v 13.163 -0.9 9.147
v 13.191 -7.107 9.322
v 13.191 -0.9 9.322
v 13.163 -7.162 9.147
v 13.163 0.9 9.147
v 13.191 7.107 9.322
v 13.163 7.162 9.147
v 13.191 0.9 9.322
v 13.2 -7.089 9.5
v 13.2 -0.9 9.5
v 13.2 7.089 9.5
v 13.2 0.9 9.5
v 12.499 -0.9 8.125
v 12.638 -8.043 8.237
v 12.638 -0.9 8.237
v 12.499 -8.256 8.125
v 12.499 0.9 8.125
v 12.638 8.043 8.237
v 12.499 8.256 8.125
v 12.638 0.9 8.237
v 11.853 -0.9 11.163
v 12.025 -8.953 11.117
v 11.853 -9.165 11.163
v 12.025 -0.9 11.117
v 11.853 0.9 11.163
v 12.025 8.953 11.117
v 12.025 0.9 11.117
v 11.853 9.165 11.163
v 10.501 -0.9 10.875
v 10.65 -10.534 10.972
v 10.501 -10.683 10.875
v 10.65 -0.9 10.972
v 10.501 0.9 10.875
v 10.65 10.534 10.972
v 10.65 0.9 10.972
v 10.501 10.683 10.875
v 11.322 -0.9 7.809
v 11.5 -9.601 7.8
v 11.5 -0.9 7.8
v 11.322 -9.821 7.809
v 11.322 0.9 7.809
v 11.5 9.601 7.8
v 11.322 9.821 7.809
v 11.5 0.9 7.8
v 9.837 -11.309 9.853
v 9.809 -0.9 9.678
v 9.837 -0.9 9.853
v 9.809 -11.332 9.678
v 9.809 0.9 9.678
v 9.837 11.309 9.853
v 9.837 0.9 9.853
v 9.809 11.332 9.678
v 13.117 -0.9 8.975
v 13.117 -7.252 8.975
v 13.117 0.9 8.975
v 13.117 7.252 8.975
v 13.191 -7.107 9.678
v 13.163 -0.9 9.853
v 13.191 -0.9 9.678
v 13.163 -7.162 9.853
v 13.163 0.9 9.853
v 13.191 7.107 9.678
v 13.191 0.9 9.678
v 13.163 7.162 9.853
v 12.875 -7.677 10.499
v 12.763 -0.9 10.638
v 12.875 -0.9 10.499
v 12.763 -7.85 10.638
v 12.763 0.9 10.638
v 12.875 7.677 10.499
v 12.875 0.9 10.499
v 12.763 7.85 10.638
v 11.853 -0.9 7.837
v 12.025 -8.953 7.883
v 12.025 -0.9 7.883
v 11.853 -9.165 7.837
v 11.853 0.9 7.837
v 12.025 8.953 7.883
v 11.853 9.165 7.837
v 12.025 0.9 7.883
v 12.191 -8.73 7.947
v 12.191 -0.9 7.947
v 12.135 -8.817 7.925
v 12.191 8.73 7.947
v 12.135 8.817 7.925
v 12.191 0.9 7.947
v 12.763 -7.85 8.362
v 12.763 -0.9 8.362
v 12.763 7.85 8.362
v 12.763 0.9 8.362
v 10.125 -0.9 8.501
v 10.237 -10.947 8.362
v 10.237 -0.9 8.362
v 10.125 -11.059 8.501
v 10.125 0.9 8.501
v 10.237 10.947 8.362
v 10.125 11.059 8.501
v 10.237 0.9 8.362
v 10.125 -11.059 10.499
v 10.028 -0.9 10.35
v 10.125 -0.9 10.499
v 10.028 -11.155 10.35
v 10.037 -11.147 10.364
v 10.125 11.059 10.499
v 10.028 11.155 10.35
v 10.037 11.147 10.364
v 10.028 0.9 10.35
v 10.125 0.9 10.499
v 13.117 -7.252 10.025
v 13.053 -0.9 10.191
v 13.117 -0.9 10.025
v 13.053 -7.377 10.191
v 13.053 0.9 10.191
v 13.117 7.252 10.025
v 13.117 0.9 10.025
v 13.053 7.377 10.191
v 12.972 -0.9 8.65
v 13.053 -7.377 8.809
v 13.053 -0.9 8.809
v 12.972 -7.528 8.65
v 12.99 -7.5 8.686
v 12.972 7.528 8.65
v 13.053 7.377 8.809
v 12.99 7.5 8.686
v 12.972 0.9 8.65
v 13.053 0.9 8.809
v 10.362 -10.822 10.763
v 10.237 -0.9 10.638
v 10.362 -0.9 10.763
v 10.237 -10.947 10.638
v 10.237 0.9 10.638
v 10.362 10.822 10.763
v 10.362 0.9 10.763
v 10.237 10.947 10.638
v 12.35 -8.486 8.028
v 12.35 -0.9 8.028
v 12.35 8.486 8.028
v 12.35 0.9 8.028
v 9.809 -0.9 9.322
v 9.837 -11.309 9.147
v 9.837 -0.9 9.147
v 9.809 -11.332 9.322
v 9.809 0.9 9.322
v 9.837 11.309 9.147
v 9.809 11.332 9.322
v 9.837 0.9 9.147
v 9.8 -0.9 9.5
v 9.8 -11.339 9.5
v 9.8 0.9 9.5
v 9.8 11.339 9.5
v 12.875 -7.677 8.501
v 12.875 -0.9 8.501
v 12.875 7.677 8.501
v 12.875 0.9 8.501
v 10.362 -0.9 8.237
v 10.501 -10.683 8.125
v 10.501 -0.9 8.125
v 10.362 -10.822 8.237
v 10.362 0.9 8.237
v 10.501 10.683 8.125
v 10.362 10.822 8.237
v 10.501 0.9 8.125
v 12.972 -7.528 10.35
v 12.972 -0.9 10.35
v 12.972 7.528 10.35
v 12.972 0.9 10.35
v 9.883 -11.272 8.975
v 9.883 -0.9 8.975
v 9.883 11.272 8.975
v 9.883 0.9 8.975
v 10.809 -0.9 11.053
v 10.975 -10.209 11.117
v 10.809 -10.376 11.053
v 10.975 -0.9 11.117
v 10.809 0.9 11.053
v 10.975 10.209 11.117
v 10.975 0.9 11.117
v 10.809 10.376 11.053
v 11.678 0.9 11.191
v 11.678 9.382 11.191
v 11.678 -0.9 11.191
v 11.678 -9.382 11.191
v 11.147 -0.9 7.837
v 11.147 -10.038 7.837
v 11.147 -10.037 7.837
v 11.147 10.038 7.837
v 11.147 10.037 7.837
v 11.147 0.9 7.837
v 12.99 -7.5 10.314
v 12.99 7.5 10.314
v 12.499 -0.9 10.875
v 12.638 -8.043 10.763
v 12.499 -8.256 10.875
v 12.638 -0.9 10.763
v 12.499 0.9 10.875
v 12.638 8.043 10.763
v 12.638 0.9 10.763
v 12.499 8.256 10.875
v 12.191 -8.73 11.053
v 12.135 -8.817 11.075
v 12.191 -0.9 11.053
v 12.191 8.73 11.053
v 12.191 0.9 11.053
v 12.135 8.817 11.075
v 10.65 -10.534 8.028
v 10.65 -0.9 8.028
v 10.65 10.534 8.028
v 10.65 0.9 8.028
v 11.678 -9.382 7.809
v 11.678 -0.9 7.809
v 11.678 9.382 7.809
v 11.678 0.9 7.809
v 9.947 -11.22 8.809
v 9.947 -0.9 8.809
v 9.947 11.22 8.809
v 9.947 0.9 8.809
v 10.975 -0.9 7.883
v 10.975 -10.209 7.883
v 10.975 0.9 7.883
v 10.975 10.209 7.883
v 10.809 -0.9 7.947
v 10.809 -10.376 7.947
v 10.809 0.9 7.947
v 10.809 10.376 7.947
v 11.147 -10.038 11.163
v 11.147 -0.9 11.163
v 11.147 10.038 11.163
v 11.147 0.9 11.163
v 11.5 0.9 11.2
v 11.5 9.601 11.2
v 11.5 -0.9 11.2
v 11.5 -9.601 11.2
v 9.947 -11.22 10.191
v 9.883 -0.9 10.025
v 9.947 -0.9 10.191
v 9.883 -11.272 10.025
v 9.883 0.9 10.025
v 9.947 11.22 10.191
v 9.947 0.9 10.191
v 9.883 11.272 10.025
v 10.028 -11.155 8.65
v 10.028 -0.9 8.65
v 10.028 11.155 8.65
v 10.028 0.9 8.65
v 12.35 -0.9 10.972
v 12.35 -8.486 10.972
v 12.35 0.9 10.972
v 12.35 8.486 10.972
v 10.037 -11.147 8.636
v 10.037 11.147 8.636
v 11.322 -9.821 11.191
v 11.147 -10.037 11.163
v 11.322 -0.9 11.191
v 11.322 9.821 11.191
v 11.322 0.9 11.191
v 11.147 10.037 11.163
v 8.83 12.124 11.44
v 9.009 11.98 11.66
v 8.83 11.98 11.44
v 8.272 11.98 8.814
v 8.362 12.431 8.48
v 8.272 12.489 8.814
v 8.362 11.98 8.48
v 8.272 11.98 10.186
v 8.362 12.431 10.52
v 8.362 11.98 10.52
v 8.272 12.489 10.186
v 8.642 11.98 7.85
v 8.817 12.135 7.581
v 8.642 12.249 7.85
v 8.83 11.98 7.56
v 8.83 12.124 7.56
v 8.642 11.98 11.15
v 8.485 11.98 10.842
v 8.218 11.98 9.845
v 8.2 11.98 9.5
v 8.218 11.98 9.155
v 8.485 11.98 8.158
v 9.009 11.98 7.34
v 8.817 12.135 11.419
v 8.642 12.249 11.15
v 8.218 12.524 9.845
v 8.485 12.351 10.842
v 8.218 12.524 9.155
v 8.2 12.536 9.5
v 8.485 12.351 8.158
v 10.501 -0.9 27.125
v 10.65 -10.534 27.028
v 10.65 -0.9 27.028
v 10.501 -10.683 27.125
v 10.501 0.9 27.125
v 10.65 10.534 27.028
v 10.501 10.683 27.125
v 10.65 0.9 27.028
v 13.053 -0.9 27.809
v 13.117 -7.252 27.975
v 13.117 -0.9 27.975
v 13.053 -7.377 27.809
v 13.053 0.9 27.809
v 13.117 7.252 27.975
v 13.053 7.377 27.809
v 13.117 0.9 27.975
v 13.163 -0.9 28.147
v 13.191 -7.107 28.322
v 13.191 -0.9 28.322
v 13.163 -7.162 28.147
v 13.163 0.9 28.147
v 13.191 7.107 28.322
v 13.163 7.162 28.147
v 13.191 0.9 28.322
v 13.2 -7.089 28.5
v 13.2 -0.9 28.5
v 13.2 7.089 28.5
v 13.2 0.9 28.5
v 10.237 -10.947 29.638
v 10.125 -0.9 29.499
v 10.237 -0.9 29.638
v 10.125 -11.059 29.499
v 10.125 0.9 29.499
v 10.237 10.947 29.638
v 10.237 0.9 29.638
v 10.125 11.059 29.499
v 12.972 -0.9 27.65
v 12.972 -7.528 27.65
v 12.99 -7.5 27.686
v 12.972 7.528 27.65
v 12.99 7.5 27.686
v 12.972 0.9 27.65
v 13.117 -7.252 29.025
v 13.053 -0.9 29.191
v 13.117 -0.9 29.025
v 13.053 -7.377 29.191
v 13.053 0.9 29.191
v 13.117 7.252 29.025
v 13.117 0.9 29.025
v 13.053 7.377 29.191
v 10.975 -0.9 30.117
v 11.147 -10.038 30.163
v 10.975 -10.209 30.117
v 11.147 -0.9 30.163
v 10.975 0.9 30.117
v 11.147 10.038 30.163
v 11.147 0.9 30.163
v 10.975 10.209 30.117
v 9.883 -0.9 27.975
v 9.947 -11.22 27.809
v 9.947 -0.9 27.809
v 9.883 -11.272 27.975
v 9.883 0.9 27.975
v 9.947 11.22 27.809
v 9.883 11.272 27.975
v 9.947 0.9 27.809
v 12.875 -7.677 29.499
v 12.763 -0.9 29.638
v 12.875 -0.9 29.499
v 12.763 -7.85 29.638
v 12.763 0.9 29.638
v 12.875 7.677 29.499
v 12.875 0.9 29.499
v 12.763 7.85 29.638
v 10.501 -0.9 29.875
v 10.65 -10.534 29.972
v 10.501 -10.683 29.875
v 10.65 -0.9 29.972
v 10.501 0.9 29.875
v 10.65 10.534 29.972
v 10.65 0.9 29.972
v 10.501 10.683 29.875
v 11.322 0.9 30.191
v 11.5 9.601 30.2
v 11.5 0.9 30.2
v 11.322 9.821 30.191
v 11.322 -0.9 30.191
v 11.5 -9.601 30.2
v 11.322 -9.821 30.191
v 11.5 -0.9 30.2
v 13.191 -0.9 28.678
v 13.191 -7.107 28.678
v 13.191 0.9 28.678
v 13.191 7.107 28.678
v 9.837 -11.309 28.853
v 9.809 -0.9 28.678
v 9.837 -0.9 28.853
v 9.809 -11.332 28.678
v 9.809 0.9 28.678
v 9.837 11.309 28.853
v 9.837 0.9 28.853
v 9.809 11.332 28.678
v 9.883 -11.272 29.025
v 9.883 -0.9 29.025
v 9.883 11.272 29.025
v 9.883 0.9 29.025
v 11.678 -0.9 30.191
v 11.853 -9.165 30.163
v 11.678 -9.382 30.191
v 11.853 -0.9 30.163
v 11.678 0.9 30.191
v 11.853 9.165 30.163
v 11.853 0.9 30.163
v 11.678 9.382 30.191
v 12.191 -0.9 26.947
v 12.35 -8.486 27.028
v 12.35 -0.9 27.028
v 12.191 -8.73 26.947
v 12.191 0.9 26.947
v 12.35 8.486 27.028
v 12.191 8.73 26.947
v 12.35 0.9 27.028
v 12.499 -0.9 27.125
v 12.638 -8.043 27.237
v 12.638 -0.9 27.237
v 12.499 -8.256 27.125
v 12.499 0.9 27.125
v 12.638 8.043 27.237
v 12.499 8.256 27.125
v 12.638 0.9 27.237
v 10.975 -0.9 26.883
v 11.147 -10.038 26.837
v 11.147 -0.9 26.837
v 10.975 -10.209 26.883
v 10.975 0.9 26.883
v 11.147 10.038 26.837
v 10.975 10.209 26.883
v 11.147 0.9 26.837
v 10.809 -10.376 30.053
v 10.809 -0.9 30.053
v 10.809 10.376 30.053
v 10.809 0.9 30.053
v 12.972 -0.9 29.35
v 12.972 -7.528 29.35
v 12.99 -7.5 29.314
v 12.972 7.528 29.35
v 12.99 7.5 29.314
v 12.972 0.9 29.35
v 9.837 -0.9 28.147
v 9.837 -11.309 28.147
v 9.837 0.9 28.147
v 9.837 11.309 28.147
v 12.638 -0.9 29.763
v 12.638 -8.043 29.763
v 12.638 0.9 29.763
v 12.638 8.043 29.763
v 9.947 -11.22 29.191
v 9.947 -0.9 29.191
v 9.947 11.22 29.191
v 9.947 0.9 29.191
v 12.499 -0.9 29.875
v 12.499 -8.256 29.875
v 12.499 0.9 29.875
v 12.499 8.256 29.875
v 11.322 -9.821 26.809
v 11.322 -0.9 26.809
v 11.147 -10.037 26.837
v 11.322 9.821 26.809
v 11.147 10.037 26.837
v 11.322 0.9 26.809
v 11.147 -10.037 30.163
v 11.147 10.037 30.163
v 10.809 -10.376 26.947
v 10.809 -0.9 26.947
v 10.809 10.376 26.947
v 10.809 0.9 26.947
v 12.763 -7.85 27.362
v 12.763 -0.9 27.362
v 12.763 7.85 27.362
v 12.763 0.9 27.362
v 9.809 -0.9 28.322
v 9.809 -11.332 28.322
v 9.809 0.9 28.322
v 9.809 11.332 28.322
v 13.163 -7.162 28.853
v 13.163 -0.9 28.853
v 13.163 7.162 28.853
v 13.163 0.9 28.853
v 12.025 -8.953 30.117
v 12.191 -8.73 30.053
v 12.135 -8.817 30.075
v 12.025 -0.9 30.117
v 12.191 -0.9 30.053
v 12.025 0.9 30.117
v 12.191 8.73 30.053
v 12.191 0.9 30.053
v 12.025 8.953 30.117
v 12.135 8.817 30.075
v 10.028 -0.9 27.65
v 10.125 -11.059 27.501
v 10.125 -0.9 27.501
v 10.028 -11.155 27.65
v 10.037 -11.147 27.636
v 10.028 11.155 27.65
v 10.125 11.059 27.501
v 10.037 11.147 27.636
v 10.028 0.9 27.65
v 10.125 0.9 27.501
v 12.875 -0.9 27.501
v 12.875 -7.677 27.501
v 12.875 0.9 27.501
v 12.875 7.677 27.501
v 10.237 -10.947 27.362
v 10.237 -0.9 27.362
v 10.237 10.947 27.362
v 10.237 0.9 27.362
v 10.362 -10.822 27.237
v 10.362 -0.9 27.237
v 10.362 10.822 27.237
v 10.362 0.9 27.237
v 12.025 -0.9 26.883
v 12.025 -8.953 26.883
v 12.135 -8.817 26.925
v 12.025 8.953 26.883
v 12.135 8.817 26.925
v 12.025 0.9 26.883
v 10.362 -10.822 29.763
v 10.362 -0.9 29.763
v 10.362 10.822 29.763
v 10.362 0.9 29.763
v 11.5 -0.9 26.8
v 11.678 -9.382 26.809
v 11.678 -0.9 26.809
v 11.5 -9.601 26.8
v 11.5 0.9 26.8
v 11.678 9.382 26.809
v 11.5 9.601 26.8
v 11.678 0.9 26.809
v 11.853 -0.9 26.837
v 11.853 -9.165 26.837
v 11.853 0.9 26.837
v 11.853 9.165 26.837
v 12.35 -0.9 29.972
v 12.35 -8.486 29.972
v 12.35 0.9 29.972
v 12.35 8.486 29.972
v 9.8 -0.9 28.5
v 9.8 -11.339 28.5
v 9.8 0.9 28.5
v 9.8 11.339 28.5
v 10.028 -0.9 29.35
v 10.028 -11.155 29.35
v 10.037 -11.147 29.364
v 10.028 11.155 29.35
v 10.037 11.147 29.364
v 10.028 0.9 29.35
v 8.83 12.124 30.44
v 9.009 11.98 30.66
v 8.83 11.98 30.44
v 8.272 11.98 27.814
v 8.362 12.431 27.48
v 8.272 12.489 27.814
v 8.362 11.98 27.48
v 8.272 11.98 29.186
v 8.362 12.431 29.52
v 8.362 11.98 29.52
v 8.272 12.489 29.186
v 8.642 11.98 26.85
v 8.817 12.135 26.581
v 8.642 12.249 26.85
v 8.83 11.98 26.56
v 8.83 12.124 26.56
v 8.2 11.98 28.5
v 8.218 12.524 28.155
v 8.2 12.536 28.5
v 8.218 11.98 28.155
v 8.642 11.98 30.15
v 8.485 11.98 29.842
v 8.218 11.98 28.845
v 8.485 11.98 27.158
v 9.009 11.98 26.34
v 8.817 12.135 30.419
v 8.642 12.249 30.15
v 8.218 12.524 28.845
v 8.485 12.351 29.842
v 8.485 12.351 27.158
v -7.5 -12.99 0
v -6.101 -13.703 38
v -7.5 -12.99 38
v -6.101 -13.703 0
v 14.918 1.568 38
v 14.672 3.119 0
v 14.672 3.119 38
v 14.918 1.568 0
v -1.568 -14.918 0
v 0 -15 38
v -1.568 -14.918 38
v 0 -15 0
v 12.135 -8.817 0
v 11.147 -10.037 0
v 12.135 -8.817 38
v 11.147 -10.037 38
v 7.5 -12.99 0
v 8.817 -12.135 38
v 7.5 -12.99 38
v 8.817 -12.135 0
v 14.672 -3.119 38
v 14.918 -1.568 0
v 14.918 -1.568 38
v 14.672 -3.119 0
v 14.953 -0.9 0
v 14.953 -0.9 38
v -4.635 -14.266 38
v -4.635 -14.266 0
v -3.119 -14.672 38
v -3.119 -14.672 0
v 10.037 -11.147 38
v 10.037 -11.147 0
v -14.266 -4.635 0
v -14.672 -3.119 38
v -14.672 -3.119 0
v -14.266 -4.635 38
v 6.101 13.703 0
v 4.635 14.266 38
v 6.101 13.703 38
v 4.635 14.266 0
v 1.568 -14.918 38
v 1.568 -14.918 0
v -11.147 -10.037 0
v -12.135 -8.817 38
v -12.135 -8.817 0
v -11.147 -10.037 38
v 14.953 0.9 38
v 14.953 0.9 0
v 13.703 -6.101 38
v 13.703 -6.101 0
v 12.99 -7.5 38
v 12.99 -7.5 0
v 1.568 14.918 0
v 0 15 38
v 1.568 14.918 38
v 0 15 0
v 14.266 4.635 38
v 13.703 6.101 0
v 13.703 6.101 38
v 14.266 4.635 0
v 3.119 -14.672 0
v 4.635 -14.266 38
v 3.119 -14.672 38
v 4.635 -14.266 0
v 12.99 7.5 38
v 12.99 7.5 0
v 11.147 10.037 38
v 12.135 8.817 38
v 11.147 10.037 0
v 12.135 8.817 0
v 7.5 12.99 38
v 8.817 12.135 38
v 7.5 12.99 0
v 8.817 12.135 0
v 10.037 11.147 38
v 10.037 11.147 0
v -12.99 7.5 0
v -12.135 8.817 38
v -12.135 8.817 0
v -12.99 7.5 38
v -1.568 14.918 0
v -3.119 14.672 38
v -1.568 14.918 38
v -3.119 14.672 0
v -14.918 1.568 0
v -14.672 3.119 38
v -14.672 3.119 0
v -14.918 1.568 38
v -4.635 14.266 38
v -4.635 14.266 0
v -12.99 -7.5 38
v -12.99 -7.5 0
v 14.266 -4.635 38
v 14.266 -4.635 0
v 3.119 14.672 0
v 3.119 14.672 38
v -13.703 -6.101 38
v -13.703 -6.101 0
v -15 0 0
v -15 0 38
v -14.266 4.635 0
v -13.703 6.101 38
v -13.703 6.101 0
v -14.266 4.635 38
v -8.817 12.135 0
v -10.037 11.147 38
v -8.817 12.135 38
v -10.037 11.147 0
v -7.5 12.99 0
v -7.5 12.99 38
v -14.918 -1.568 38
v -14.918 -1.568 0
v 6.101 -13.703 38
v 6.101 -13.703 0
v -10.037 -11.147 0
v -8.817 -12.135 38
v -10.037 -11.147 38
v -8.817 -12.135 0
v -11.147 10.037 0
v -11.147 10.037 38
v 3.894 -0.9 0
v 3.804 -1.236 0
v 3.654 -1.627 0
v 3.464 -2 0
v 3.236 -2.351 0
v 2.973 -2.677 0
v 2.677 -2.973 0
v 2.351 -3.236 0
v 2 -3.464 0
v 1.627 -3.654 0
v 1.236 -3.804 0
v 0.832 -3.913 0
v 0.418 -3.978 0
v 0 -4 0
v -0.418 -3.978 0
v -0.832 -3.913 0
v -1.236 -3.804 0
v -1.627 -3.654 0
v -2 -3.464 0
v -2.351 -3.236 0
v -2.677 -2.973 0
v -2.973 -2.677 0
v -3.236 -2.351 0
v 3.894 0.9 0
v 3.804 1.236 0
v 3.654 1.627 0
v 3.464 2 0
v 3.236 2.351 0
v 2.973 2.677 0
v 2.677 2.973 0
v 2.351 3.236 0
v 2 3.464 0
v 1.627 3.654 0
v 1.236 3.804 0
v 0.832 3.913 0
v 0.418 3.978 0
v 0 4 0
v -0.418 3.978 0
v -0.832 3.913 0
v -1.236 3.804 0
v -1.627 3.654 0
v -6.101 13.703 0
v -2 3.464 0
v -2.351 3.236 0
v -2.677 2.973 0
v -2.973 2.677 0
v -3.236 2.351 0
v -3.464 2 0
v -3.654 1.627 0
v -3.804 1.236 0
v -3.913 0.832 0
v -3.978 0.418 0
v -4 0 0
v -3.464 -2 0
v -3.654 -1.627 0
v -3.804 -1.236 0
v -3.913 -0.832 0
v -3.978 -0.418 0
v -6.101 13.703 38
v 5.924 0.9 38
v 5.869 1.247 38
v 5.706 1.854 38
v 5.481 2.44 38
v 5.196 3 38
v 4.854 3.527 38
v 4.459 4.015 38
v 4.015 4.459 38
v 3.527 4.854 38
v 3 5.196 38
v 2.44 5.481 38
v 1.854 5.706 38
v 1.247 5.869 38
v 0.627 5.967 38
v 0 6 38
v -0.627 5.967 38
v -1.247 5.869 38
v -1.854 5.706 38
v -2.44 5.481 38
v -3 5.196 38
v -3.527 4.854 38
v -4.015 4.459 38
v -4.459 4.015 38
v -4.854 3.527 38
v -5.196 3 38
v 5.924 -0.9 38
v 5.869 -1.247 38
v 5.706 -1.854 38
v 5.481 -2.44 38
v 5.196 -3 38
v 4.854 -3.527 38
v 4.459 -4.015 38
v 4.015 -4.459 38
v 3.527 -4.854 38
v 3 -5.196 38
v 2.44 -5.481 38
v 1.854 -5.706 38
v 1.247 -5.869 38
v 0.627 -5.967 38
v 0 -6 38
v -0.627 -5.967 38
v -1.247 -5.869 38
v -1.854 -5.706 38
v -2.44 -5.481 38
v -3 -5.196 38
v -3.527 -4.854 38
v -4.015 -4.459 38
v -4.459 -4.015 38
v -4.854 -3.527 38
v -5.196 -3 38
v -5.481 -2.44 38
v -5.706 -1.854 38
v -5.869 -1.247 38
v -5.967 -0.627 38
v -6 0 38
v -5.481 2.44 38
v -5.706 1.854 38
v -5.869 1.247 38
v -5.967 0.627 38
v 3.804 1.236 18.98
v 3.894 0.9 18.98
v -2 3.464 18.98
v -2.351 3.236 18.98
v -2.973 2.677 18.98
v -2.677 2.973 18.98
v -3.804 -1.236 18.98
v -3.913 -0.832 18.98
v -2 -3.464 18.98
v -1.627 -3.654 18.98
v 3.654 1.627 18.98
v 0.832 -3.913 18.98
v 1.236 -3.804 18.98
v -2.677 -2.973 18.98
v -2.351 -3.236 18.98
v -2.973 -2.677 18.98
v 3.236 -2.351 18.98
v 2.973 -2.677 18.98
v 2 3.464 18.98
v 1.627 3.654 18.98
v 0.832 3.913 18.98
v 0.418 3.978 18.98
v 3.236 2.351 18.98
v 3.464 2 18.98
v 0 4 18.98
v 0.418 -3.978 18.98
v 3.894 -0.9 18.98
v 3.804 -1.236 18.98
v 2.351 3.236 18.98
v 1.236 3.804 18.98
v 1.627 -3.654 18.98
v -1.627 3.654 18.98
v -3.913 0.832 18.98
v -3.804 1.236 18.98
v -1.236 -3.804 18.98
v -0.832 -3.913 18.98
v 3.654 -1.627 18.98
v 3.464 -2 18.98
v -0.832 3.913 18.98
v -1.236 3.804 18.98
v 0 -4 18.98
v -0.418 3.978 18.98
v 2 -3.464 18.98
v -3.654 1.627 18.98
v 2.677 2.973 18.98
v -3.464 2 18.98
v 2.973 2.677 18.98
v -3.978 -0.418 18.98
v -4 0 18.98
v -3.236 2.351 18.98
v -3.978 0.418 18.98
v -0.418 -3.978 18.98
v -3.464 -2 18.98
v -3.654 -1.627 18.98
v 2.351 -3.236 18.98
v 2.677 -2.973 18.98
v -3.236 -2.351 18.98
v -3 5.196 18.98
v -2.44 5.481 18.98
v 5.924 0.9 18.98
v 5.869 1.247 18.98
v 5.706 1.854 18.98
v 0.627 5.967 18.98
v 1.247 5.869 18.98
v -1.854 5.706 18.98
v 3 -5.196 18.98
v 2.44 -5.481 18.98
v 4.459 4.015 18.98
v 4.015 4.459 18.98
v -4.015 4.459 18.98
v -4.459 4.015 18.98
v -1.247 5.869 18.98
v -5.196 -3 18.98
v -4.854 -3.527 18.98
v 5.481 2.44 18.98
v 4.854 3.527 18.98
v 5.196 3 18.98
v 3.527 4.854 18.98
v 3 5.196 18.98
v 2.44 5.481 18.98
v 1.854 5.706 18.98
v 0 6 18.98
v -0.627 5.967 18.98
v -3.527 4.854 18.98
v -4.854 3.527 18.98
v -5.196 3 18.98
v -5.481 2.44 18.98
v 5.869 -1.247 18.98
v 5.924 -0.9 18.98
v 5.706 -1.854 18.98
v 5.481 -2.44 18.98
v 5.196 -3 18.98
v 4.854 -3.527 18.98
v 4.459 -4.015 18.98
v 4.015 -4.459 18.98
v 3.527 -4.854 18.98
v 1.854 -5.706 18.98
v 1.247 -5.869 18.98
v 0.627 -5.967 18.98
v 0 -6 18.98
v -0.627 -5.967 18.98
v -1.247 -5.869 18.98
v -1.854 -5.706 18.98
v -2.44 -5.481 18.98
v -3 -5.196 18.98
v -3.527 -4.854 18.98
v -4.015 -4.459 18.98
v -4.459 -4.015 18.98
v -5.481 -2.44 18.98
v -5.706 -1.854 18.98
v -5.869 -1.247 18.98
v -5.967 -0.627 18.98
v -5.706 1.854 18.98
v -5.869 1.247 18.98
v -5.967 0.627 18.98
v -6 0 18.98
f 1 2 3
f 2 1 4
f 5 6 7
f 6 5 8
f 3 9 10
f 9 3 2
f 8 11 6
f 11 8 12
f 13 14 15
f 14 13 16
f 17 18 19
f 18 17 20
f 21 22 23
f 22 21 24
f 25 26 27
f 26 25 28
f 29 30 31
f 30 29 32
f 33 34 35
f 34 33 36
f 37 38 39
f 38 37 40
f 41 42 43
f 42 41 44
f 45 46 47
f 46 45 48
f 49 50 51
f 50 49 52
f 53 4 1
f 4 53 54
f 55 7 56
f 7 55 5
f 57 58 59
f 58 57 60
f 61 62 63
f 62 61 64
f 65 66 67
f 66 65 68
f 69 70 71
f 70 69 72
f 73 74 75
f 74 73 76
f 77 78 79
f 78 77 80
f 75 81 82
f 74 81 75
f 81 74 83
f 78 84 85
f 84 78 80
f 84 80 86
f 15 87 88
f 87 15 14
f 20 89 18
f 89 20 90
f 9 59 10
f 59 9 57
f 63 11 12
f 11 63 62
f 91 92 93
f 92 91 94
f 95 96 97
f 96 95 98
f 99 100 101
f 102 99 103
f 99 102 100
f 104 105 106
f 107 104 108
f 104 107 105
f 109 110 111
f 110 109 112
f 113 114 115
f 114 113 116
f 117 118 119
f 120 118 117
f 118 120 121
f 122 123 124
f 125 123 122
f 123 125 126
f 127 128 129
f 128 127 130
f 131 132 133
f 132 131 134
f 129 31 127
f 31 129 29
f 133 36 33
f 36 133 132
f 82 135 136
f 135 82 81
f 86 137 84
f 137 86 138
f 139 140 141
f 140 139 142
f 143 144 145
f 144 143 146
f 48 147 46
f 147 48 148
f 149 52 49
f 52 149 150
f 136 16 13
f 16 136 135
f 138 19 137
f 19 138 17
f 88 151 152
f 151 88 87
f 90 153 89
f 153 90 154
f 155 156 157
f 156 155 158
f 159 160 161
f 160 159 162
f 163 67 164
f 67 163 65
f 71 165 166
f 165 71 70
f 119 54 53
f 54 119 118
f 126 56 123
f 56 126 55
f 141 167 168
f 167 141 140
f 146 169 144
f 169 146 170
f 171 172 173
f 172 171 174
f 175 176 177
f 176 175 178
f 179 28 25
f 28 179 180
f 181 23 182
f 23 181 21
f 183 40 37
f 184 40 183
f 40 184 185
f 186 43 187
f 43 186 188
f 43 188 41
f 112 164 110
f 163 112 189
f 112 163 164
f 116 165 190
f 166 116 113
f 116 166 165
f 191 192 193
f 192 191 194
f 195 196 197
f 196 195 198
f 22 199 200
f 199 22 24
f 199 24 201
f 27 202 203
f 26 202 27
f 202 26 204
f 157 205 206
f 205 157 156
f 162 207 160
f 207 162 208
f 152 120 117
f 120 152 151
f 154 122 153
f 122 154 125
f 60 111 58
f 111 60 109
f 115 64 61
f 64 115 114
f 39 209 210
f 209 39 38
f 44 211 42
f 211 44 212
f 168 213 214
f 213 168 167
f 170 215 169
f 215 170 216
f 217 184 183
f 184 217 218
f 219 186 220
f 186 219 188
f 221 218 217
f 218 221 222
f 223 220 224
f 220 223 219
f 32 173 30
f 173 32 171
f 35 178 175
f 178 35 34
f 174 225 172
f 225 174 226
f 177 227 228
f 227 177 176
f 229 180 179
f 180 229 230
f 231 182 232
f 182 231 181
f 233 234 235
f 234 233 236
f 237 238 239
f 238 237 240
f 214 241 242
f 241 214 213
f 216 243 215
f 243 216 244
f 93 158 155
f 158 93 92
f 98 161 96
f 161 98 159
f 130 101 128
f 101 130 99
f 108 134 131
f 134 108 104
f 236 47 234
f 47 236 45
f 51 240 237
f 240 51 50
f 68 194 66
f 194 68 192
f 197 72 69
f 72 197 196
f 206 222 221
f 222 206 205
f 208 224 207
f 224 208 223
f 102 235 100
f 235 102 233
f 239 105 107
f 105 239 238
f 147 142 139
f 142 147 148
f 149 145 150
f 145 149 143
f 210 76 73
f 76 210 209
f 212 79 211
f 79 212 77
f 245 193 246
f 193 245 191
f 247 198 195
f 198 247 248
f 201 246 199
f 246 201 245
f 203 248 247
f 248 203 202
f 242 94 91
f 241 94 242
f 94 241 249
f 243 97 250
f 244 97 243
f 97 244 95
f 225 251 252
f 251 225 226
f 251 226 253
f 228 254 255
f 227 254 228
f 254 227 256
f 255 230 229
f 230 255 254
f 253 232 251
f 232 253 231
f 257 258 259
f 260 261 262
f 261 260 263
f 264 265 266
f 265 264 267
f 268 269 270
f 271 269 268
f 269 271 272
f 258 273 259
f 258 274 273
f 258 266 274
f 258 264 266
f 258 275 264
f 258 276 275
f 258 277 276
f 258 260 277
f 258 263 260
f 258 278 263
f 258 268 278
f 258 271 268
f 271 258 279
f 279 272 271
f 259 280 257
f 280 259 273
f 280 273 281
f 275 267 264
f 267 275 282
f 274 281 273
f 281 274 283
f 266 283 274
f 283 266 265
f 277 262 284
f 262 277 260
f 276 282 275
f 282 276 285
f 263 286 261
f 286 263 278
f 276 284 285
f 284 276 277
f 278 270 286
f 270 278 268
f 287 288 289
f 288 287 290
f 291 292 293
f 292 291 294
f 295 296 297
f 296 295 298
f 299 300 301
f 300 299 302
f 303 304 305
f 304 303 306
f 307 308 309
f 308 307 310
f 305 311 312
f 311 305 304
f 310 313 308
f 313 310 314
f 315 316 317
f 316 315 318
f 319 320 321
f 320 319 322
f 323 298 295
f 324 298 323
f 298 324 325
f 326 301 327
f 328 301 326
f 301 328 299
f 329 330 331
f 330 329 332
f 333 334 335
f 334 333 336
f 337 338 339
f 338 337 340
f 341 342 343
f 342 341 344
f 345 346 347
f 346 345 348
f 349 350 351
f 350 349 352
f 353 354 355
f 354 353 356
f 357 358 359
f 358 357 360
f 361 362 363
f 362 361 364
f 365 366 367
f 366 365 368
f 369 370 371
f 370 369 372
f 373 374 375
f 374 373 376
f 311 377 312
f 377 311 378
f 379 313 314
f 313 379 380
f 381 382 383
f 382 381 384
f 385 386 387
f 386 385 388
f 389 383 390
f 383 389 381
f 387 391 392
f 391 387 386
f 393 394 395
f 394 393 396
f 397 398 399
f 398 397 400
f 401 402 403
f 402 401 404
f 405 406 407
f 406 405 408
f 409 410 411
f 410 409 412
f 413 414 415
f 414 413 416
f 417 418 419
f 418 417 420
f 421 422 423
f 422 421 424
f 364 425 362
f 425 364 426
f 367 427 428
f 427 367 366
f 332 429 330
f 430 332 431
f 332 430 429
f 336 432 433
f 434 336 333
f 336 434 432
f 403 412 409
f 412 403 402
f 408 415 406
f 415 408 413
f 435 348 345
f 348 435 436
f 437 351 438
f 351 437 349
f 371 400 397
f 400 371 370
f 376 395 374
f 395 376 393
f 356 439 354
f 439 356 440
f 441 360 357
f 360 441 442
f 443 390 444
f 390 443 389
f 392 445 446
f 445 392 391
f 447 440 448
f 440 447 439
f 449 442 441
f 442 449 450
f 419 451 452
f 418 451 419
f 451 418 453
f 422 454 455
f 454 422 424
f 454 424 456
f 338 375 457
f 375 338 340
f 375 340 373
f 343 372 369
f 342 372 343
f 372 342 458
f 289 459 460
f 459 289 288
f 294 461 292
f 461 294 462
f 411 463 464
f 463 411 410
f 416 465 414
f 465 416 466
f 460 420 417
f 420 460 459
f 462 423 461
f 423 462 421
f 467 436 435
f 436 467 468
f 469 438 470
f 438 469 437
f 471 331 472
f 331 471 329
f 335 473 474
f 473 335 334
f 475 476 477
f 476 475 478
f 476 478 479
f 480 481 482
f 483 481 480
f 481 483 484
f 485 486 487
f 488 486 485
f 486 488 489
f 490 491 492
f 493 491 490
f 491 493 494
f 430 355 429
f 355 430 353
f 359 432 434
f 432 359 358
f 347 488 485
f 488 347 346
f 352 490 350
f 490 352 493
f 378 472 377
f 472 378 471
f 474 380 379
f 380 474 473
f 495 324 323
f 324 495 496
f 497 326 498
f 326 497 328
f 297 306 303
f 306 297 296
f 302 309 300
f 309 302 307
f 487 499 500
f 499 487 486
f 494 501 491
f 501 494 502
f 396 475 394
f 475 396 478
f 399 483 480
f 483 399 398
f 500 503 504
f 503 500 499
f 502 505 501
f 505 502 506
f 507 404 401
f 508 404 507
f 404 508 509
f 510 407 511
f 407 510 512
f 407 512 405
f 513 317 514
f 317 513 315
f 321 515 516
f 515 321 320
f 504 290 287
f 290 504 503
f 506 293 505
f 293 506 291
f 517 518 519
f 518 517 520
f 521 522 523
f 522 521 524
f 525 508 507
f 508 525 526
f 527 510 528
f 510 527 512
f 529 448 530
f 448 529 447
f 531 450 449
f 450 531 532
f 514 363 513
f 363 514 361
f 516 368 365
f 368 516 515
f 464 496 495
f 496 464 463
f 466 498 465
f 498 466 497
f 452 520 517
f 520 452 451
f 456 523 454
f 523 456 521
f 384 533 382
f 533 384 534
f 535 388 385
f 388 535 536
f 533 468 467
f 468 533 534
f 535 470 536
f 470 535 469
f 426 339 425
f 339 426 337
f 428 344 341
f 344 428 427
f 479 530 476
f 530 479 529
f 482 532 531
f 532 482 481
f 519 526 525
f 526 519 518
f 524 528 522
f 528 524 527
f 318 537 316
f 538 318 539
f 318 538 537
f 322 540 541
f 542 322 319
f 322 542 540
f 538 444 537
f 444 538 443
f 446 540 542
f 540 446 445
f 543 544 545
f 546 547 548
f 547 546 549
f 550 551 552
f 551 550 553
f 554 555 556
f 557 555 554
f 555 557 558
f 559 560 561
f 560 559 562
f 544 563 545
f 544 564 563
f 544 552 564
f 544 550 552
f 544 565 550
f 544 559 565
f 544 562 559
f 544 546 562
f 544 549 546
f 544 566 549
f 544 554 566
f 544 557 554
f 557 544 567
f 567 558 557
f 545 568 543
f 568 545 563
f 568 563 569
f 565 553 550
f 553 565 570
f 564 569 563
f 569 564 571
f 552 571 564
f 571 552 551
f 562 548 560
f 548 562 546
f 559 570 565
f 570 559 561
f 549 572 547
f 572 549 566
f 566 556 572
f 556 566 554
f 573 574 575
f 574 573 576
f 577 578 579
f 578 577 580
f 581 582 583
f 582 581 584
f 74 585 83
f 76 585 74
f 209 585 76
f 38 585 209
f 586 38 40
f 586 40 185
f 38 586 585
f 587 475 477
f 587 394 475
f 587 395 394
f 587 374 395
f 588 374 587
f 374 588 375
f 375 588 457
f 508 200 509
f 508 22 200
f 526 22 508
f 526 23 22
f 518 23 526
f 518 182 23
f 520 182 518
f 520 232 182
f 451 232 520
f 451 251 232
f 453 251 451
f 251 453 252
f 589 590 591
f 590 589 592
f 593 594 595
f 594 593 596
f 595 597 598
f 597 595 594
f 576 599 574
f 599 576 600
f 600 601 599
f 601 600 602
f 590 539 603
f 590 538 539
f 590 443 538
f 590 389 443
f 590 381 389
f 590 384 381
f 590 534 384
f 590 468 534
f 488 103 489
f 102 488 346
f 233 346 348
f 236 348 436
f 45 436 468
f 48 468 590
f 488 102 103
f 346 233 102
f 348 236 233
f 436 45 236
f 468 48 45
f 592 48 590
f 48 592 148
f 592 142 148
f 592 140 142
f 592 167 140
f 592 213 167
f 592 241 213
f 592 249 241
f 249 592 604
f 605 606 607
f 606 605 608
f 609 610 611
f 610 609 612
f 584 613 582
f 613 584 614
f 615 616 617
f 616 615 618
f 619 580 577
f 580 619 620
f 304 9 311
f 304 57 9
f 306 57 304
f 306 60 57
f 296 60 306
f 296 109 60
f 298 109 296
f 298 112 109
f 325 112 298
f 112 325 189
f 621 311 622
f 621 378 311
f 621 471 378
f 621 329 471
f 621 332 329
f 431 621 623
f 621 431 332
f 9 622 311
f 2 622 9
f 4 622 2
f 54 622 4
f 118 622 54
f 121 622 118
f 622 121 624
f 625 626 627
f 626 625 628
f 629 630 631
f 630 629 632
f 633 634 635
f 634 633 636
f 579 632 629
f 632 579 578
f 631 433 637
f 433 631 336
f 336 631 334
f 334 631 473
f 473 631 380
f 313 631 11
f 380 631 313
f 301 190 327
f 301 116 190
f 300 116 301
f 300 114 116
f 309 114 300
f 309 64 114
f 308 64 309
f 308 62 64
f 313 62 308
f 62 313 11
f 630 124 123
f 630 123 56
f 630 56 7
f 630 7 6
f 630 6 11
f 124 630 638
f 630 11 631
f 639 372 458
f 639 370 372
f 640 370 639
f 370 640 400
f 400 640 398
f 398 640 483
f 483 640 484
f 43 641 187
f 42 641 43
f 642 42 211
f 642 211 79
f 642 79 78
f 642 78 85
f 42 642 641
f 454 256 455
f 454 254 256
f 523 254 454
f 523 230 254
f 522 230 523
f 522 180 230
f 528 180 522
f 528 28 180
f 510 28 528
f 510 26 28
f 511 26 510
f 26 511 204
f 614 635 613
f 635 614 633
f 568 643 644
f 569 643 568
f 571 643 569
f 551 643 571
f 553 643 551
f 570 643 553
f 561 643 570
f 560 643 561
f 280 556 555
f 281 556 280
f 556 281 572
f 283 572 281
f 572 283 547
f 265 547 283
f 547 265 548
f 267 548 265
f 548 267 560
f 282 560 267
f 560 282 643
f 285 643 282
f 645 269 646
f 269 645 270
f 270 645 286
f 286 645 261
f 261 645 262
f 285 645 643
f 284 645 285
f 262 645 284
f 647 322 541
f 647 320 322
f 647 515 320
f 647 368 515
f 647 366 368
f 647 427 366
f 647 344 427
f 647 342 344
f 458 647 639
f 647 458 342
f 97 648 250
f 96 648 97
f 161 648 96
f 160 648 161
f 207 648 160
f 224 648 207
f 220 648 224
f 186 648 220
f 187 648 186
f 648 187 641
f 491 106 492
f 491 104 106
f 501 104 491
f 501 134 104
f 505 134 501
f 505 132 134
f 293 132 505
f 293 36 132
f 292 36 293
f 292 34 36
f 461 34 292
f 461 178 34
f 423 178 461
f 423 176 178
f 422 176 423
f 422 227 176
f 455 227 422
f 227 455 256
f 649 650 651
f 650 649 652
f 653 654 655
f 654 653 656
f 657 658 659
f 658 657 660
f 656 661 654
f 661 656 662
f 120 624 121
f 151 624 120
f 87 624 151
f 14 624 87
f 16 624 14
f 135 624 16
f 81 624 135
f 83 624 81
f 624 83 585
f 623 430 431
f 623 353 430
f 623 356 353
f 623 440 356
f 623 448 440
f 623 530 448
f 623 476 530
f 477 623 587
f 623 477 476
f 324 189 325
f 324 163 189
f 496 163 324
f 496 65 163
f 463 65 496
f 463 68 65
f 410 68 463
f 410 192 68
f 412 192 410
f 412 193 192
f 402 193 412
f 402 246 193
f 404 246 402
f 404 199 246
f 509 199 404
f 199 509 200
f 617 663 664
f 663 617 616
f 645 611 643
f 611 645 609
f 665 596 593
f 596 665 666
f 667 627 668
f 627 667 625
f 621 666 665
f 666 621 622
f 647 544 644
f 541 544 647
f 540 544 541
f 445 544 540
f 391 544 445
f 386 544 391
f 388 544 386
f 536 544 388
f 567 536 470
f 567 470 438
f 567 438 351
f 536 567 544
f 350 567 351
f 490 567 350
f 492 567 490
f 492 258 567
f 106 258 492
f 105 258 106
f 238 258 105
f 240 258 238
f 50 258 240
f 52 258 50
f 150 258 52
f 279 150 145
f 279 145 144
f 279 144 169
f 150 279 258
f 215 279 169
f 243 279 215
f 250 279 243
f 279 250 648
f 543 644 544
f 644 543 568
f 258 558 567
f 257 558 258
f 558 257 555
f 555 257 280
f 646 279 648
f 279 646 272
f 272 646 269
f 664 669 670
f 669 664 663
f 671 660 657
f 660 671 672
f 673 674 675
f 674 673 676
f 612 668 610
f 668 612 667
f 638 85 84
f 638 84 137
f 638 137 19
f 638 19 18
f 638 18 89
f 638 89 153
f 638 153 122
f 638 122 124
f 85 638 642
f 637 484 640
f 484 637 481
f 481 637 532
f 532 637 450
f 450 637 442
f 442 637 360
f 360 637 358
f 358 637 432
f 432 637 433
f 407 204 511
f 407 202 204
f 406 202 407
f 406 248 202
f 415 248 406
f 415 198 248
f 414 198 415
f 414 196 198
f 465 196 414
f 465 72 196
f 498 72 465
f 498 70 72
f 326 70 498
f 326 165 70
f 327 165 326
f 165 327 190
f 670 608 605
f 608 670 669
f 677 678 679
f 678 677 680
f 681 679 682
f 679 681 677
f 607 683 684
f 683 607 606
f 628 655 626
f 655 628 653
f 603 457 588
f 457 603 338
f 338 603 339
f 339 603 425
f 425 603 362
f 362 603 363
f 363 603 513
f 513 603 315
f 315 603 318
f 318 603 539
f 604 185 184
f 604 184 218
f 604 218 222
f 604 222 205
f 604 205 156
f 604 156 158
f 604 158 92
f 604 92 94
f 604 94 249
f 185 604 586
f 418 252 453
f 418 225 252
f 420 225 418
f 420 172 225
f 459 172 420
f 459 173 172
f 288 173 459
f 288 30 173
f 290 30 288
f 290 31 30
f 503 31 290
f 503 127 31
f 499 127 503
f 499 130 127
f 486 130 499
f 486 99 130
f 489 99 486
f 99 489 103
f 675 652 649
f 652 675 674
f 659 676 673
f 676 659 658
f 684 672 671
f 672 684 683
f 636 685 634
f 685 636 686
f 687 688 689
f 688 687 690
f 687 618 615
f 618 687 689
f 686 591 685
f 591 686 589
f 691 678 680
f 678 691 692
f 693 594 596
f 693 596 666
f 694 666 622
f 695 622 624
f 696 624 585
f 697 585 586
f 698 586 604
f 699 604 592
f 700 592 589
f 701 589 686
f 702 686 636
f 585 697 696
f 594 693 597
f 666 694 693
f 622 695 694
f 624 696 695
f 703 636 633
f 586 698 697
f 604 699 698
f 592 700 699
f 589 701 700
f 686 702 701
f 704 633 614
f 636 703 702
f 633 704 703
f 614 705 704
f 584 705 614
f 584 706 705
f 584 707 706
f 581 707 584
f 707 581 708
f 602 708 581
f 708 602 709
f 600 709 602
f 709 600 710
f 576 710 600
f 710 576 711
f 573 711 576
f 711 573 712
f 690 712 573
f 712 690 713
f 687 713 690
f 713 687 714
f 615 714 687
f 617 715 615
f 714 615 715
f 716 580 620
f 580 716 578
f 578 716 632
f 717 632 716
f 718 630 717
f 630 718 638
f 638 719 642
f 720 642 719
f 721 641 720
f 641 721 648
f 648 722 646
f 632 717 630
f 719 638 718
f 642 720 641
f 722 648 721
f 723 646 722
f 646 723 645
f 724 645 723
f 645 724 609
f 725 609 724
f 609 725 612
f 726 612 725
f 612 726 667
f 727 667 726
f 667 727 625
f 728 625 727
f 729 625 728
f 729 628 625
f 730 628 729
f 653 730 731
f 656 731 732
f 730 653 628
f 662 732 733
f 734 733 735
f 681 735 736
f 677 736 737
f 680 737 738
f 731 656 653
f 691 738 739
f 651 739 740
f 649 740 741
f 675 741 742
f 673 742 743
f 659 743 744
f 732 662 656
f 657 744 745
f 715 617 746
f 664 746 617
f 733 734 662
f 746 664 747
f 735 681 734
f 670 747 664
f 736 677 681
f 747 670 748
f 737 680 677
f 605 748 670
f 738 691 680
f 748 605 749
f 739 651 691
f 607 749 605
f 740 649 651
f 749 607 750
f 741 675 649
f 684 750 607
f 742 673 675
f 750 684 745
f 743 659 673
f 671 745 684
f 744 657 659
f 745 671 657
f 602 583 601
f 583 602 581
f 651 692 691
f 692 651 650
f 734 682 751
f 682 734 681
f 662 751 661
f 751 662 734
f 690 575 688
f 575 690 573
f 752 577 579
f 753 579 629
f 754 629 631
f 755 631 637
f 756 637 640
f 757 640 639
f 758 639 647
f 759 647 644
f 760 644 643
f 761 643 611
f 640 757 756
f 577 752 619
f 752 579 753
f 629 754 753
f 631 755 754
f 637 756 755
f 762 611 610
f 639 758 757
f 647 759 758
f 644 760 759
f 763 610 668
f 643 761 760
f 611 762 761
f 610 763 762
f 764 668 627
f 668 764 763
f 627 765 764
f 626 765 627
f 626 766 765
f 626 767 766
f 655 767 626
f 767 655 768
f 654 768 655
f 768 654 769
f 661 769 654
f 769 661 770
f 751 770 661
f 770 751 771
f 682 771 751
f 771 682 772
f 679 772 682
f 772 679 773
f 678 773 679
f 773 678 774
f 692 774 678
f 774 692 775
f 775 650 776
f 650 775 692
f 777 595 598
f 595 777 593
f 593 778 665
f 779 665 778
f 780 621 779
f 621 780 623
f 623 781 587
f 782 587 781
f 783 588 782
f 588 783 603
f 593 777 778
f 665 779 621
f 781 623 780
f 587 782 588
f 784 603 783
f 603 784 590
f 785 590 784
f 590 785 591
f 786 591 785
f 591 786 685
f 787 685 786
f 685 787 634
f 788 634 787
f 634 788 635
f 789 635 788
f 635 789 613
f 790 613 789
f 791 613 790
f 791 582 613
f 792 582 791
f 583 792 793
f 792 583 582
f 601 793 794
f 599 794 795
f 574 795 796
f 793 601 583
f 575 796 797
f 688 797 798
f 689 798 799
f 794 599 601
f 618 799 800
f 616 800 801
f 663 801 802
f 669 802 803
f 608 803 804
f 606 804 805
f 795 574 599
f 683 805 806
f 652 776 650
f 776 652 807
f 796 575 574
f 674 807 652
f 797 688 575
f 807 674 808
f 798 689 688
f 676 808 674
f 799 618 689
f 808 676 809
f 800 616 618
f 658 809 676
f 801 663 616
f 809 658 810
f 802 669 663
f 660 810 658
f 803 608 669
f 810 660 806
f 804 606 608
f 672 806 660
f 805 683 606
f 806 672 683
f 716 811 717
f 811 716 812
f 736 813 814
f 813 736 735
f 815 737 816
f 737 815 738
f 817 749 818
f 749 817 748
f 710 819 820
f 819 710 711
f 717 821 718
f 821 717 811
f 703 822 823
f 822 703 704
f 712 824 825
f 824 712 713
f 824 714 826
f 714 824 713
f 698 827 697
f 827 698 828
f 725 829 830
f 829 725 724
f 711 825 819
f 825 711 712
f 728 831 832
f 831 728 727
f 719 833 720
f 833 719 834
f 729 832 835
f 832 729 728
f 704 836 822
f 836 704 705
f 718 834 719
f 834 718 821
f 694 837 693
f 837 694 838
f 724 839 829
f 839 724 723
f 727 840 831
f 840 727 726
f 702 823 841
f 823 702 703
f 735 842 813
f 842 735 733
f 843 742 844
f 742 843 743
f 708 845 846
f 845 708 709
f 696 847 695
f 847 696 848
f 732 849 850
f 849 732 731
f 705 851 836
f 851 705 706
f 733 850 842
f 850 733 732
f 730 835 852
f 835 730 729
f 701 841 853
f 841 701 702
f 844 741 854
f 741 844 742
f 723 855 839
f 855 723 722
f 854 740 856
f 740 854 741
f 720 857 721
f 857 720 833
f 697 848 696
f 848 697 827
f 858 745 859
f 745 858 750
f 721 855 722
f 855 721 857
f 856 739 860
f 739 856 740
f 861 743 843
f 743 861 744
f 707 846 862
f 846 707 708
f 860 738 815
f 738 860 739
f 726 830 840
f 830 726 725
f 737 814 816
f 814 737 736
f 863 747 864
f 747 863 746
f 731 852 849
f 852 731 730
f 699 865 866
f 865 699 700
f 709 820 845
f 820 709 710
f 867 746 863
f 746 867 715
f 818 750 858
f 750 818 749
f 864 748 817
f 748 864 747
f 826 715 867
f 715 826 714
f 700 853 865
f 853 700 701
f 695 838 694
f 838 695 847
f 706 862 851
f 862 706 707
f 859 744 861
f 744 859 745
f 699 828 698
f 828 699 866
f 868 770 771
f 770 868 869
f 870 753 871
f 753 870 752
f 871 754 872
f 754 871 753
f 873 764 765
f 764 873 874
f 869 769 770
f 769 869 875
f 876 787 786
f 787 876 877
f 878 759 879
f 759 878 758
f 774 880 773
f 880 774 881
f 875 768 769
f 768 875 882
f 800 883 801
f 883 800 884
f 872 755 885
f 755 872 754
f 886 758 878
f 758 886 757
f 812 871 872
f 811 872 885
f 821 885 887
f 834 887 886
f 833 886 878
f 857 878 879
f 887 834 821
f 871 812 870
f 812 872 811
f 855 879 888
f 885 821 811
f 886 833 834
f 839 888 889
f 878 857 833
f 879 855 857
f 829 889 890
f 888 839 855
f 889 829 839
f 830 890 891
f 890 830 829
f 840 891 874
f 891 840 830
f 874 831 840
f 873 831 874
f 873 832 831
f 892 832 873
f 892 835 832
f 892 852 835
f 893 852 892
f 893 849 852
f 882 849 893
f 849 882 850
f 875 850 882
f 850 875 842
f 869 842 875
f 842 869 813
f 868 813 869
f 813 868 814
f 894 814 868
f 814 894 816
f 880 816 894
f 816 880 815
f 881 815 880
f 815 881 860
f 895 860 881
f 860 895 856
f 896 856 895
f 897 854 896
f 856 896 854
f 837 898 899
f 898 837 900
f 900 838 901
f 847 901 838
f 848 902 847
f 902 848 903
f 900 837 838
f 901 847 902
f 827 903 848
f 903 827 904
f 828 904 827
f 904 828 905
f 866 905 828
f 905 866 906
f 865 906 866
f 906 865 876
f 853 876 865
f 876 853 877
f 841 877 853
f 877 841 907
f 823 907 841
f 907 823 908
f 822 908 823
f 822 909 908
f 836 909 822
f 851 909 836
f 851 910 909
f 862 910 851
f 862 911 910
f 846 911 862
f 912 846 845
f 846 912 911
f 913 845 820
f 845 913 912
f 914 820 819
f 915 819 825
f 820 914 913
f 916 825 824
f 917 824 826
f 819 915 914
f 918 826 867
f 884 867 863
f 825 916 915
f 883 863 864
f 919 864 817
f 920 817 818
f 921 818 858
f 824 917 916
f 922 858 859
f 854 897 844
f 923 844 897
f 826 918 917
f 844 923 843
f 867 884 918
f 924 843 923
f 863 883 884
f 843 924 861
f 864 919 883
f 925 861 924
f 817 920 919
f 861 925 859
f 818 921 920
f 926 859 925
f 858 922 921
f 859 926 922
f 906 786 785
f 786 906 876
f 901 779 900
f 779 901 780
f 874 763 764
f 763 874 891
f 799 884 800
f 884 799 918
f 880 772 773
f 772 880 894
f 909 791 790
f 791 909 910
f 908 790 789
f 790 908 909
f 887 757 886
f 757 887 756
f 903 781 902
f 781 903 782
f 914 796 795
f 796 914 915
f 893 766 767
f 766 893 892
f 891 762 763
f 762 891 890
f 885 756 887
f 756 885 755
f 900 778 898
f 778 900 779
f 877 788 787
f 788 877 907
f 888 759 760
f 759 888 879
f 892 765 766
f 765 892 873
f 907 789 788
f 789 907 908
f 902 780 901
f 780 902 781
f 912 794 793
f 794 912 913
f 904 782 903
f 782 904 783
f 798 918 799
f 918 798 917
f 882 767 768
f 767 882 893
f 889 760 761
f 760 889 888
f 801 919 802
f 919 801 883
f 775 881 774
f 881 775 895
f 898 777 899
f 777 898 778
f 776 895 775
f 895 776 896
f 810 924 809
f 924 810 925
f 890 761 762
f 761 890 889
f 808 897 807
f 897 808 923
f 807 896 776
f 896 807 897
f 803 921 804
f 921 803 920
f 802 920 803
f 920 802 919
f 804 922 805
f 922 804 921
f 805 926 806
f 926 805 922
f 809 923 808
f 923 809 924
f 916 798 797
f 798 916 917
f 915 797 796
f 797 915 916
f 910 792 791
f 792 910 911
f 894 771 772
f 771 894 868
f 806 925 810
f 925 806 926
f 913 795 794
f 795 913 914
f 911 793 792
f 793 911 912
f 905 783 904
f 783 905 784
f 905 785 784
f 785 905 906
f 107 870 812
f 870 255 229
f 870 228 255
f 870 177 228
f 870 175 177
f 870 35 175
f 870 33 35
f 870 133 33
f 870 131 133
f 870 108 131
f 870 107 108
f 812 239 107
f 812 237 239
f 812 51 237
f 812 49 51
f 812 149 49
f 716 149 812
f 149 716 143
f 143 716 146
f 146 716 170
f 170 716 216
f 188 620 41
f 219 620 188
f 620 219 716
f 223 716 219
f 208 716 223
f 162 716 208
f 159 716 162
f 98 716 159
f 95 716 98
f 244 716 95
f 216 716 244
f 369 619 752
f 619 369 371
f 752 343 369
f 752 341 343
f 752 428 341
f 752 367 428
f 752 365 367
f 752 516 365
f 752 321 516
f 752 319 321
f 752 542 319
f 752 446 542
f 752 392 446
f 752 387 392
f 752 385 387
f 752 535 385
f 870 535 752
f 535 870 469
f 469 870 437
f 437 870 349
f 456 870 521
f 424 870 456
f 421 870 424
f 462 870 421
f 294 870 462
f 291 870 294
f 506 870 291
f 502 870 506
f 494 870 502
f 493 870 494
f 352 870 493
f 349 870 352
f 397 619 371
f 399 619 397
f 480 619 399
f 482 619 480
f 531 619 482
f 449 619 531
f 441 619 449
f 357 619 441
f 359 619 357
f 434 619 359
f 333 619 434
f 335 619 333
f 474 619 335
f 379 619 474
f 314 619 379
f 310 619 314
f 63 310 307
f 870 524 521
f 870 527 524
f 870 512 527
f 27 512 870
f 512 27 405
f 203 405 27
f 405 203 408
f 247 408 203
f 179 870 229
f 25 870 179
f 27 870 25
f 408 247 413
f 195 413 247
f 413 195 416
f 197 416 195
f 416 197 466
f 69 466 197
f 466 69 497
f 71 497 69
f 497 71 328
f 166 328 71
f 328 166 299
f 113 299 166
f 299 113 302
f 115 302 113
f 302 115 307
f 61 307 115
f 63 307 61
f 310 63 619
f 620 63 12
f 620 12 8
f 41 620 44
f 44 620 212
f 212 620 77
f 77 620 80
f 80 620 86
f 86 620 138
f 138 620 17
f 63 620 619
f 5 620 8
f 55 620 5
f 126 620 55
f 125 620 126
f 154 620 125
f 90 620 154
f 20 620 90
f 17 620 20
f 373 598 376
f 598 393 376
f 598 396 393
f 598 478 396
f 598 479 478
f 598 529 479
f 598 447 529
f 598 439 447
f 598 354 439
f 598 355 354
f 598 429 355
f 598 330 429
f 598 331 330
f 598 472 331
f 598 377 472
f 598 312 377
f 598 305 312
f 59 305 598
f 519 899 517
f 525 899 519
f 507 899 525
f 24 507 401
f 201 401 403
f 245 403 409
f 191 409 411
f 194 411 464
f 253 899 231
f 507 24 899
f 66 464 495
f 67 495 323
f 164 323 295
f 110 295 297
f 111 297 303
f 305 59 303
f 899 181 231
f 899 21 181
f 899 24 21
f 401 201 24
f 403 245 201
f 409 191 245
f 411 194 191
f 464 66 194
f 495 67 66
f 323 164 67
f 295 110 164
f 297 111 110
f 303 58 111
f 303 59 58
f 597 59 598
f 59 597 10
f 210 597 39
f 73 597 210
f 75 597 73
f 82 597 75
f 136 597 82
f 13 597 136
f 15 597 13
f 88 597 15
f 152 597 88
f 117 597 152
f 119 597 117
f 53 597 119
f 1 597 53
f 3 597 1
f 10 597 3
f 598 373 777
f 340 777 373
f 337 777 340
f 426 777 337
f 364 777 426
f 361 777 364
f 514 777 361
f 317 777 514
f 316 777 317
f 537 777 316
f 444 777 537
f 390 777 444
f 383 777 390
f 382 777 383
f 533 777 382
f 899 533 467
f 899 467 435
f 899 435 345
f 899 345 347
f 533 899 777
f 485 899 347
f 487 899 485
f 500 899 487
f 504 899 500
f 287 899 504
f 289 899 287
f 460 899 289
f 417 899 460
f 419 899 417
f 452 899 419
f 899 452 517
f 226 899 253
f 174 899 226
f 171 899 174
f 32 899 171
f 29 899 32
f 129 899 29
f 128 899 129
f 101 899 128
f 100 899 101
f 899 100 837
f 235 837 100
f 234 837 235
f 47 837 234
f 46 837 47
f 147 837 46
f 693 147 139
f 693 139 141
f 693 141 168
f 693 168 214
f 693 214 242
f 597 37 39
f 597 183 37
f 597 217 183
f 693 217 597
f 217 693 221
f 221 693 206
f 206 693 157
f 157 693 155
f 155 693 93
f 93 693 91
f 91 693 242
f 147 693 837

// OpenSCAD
// Split shaft coupling 8 mm to 12 mm.
$fn = 60;
eps = 0.02;
shaft_a = 8;
shaft_b = 12;
outer_d = 30;
length = 38;
slit_w = 1.8;
screw_d = 3.4;
module clamp_hole(z) {
    translate([outer_d / 2 - 3.5, -outer_d / 2 - eps, z]) rotate([-90, 0, 0]) cylinder(d = screw_d, h = outer_d + 2 * eps);
    translate([outer_d / 2 - 3.5, outer_d / 2 - 3 - eps, z]) rotate([-90, 0, 0]) cylinder(d = 6.6, h = 3 + 2 * eps);
}
difference() {
    cylinder(d = outer_d, h = length);
    translate([0, 0, -eps]) cylinder(d = shaft_a, h = length / 2 + eps);
    translate([0, 0, length / 2 - eps]) cylinder(d = shaft_b, h = length / 2 + eps);
    translate([0, -slit_w / 2, -eps]) cube([outer_d / 2 + eps, slit_w, length + 2 * eps]);
    clamp_hole(length / 4);
    clamp_hole(3 * length / 4);
}
